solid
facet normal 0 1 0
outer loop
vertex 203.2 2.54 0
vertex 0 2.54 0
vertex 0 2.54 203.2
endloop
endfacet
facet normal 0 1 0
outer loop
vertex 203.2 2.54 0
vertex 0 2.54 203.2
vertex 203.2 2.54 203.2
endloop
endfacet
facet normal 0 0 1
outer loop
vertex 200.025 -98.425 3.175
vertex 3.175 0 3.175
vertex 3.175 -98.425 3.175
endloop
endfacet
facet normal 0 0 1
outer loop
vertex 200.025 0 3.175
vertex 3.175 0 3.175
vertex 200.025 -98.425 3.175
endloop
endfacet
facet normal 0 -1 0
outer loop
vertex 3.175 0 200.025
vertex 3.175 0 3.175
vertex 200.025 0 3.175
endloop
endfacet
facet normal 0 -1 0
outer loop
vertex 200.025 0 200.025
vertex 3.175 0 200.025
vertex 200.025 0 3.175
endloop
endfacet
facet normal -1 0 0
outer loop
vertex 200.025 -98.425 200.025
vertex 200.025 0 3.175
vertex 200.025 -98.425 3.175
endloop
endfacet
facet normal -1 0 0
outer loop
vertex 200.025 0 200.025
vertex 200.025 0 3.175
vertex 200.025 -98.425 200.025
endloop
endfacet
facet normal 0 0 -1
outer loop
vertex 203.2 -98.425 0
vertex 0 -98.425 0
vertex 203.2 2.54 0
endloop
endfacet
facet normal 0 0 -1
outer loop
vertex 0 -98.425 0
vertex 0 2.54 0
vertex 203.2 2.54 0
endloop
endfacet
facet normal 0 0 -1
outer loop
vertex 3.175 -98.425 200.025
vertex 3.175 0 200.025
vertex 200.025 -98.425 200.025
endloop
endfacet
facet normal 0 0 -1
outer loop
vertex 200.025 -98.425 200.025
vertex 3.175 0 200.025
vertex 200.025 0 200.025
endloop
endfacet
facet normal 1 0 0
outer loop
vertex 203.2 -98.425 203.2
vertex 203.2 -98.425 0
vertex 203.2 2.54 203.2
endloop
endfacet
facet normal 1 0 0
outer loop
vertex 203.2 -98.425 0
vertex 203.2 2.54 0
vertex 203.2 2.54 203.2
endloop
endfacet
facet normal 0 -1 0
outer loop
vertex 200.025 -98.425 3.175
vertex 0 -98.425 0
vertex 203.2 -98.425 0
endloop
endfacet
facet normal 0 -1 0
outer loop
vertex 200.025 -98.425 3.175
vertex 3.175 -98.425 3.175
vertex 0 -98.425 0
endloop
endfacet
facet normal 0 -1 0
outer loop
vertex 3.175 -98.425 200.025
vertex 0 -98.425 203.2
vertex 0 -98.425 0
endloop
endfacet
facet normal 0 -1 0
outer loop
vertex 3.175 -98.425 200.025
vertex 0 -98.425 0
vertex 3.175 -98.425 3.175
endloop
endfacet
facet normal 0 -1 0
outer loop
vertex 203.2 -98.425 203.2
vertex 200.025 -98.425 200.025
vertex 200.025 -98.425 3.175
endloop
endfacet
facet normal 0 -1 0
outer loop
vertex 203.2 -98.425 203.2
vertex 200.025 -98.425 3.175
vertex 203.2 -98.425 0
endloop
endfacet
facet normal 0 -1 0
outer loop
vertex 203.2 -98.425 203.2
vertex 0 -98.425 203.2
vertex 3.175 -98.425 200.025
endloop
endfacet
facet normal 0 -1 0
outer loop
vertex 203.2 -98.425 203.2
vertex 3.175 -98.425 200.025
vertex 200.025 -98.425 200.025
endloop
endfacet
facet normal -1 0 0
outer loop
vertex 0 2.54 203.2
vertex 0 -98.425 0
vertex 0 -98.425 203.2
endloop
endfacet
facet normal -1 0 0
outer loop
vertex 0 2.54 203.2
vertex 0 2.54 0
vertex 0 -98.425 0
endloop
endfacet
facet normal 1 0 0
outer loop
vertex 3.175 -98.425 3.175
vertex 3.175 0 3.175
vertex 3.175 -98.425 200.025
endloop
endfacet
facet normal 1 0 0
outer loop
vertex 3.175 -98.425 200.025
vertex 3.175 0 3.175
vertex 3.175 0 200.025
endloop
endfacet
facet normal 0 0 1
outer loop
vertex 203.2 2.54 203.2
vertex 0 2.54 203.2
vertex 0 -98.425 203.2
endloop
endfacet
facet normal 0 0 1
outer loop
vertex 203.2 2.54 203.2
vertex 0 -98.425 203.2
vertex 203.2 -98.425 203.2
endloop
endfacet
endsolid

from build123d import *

# Parameters (mm, degrees)
SKETCH1_W           = 203.2
SKETCH1_H           = 203.2
BOSS_EXTRUDE1_DEPTH = 2.54
SKETCH2_W           = 203.2
SKETCH2_H           = 203.2
SKETCH2_W_2         = 196.85
SKETCH2_H_2         = 196.85
BOSS_EXTRUDE2_DEPTH = 98.425


with BuildPart() as part:
    # Sketch1 → Boss-Extrude1 (new body)
    with BuildSketch(Plane(origin=(0, 0, 0), x_dir=(1, 0, 0), z_dir=(0, 1, 0))):
        with Locations((101.6, -101.6)):
            Rectangle(SKETCH1_W, SKETCH1_H)
    extrude(amount=BOSS_EXTRUDE1_DEPTH)

    # Sketch2 → Boss-Extrude2 (add)
    with BuildSketch(Plane.XZ):
        with Locations((101.6, 101.6)):
            Rectangle(SKETCH2_W, SKETCH2_H)
        with Locations((101.6, 101.6)):
            Rectangle(SKETCH2_W_2, SKETCH2_H_2, mode=Mode.SUBTRACT)
    extrude(amount=BOSS_EXTRUDE2_DEPTH)


solid = part.part
